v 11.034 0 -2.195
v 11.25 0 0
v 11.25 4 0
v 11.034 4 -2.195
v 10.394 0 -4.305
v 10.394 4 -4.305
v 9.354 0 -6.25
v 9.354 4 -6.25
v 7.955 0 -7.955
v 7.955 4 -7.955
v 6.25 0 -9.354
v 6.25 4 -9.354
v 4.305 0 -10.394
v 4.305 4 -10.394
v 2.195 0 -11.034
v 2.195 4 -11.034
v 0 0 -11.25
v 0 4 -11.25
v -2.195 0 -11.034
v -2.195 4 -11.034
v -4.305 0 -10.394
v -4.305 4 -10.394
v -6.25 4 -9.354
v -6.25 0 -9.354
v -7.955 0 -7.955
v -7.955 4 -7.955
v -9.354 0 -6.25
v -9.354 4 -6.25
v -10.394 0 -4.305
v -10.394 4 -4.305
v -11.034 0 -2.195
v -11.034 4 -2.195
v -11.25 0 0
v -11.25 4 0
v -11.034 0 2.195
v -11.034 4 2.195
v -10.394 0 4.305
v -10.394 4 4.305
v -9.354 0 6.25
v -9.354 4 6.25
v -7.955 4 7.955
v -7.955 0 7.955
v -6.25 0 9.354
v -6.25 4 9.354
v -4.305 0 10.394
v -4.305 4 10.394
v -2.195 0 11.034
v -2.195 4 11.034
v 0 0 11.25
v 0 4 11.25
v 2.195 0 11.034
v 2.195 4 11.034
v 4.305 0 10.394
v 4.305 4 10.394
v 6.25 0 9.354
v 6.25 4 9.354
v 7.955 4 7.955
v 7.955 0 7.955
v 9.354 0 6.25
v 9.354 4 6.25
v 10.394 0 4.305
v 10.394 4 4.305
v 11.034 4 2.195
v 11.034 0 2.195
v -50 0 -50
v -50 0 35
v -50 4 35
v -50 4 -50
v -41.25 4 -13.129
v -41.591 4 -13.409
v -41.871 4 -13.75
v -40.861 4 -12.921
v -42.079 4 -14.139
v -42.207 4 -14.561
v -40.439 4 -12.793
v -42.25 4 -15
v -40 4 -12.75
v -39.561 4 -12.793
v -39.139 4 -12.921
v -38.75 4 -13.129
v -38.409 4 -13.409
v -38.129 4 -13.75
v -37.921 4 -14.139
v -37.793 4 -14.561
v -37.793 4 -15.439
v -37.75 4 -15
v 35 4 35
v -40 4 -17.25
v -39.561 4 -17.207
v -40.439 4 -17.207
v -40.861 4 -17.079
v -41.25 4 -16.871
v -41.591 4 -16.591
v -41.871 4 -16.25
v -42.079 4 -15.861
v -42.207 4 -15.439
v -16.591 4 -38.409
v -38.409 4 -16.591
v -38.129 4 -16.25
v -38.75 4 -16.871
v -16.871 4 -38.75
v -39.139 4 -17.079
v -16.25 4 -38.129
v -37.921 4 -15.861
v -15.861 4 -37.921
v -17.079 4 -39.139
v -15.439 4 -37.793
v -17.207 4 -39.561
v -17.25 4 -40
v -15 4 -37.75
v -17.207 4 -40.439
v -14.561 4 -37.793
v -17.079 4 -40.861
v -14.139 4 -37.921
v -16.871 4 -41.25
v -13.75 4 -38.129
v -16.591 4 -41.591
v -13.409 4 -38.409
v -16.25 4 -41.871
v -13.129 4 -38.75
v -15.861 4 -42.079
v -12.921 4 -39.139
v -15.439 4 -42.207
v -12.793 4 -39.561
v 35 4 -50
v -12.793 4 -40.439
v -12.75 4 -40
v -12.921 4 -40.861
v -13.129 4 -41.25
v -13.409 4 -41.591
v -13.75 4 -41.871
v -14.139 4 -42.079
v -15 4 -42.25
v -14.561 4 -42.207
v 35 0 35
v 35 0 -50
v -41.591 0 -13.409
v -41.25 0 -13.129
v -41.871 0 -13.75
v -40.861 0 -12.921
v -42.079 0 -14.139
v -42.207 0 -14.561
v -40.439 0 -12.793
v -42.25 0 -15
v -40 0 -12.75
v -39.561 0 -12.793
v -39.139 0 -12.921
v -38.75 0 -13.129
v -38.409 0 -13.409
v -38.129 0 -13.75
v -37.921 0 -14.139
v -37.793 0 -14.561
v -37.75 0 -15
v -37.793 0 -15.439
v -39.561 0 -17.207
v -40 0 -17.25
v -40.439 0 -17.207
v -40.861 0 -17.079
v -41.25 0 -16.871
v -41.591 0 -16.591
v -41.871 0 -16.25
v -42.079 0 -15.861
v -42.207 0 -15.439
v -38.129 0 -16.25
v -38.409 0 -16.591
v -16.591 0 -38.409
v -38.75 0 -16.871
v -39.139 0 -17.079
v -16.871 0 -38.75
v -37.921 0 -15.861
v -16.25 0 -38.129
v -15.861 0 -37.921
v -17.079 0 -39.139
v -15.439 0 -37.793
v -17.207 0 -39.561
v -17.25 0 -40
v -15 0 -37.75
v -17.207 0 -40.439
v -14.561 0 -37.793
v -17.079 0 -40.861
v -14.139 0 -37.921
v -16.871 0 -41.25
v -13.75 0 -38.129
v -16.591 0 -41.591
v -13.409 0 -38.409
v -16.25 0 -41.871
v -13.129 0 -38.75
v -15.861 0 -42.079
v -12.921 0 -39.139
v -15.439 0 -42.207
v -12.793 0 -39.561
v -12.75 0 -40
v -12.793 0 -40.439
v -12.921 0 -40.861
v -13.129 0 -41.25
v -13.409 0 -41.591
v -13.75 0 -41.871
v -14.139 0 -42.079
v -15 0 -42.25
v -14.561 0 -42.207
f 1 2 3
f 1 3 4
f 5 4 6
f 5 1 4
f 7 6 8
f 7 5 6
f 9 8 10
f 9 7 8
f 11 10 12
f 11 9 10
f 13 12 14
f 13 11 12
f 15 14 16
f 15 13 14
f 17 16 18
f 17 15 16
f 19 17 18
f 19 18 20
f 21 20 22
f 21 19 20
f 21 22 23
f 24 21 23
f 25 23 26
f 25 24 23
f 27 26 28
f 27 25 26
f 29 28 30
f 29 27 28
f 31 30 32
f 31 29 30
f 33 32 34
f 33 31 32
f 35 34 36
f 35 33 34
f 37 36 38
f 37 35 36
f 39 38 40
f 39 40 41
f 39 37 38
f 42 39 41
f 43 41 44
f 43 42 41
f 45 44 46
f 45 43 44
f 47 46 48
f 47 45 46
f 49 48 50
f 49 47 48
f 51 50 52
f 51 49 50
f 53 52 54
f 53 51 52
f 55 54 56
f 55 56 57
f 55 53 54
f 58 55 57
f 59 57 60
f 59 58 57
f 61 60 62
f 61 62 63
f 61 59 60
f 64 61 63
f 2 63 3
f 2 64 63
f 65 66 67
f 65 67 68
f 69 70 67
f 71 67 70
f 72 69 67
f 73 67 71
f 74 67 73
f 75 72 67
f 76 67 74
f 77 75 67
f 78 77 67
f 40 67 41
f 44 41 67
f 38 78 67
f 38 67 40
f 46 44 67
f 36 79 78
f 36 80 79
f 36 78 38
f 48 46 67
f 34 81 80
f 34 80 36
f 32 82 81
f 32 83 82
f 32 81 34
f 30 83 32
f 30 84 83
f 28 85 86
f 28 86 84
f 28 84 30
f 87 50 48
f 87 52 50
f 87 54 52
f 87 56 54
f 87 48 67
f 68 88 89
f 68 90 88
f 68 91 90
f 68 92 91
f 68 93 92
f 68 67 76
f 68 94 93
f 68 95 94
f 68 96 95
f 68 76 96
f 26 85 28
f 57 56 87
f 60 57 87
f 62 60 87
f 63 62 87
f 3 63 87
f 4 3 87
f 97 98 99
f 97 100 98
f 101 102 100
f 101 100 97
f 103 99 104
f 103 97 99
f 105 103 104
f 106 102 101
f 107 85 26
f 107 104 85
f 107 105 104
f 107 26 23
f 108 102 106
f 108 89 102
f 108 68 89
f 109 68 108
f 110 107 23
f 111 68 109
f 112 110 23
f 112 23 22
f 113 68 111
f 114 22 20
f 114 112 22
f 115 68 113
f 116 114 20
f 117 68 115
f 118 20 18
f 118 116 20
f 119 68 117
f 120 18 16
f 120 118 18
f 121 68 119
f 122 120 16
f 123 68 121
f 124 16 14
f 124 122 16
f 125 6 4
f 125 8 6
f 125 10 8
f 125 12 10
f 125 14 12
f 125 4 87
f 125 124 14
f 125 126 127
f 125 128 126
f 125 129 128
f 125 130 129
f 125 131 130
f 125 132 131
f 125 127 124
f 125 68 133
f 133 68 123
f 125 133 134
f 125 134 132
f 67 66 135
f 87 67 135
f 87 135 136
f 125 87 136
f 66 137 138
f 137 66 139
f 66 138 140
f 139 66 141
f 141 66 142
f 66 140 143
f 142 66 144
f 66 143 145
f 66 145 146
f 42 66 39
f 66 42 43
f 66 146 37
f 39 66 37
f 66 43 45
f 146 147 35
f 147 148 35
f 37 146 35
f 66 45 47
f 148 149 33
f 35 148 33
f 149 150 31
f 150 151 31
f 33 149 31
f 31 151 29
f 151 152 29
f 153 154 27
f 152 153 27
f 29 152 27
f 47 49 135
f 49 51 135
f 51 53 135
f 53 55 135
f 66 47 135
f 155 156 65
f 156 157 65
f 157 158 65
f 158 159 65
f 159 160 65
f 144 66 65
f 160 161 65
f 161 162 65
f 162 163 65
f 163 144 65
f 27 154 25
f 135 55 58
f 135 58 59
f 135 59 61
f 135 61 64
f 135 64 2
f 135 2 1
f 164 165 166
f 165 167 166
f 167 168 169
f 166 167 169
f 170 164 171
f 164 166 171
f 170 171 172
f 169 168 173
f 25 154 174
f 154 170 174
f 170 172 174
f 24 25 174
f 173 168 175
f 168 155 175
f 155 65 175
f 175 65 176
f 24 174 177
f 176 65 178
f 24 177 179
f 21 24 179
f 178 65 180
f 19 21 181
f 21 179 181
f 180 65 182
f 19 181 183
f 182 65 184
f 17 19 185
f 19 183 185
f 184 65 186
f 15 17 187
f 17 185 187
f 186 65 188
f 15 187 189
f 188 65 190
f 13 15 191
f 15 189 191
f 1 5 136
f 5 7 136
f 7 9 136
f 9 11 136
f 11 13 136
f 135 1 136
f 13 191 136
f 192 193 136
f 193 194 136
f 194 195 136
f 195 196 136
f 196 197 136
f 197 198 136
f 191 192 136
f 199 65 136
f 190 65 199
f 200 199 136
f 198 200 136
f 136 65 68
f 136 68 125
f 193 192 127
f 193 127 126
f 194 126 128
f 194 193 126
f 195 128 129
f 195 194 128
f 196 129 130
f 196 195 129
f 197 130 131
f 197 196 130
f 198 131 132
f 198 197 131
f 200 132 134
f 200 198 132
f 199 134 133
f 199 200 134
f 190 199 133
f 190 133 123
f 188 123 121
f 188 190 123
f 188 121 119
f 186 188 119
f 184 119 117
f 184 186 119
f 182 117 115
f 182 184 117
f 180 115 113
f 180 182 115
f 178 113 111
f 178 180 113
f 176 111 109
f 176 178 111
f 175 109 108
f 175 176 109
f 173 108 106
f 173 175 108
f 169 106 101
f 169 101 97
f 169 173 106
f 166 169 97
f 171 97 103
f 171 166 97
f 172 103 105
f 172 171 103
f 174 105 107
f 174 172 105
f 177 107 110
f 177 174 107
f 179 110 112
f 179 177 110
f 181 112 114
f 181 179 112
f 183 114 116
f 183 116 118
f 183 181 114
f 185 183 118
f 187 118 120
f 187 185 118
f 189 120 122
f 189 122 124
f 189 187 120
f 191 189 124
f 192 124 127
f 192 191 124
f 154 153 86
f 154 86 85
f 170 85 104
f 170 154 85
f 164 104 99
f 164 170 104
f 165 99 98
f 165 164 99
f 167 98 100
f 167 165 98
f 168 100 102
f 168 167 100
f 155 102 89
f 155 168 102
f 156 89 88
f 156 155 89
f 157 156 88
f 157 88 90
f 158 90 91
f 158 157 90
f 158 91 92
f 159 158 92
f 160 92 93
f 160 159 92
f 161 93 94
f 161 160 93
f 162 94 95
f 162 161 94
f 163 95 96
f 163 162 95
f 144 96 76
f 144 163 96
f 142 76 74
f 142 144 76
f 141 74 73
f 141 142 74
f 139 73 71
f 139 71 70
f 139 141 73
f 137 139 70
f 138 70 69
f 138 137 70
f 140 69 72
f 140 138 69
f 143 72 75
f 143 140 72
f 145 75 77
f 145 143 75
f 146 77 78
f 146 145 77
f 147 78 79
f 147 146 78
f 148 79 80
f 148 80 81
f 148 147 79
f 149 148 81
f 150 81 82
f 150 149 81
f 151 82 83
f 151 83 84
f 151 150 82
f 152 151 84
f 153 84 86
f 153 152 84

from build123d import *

# Parameters (mm, degrees)
SKETCH1_W           = 85
SKETCH1_H           = 85
SKETCH1_R           = 11.25
SKETCH1_R_2         = 2.25
BOSS_EXTRUDE1_DEPTH = 4


with BuildPart() as part:
    # Sketch1 → Boss-Extrude1 (new body)
    with BuildSketch(Plane(origin=(0, 0, 0), x_dir=(1, 0, 0), z_dir=(0, 1, 0))):
        with Locations((-7.5, 7.5)):
            Rectangle(SKETCH1_W, SKETCH1_H)
        Circle(SKETCH1_R, mode=Mode.SUBTRACT)
        with Locations((-15, 40)):
            Circle(SKETCH1_R_2, mode=Mode.SUBTRACT)
        with Locations((-40, 15)):
            Circle(SKETCH1_R_2, mode=Mode.SUBTRACT)
    extrude(amount=BOSS_EXTRUDE1_DEPTH)


solid = part.part
